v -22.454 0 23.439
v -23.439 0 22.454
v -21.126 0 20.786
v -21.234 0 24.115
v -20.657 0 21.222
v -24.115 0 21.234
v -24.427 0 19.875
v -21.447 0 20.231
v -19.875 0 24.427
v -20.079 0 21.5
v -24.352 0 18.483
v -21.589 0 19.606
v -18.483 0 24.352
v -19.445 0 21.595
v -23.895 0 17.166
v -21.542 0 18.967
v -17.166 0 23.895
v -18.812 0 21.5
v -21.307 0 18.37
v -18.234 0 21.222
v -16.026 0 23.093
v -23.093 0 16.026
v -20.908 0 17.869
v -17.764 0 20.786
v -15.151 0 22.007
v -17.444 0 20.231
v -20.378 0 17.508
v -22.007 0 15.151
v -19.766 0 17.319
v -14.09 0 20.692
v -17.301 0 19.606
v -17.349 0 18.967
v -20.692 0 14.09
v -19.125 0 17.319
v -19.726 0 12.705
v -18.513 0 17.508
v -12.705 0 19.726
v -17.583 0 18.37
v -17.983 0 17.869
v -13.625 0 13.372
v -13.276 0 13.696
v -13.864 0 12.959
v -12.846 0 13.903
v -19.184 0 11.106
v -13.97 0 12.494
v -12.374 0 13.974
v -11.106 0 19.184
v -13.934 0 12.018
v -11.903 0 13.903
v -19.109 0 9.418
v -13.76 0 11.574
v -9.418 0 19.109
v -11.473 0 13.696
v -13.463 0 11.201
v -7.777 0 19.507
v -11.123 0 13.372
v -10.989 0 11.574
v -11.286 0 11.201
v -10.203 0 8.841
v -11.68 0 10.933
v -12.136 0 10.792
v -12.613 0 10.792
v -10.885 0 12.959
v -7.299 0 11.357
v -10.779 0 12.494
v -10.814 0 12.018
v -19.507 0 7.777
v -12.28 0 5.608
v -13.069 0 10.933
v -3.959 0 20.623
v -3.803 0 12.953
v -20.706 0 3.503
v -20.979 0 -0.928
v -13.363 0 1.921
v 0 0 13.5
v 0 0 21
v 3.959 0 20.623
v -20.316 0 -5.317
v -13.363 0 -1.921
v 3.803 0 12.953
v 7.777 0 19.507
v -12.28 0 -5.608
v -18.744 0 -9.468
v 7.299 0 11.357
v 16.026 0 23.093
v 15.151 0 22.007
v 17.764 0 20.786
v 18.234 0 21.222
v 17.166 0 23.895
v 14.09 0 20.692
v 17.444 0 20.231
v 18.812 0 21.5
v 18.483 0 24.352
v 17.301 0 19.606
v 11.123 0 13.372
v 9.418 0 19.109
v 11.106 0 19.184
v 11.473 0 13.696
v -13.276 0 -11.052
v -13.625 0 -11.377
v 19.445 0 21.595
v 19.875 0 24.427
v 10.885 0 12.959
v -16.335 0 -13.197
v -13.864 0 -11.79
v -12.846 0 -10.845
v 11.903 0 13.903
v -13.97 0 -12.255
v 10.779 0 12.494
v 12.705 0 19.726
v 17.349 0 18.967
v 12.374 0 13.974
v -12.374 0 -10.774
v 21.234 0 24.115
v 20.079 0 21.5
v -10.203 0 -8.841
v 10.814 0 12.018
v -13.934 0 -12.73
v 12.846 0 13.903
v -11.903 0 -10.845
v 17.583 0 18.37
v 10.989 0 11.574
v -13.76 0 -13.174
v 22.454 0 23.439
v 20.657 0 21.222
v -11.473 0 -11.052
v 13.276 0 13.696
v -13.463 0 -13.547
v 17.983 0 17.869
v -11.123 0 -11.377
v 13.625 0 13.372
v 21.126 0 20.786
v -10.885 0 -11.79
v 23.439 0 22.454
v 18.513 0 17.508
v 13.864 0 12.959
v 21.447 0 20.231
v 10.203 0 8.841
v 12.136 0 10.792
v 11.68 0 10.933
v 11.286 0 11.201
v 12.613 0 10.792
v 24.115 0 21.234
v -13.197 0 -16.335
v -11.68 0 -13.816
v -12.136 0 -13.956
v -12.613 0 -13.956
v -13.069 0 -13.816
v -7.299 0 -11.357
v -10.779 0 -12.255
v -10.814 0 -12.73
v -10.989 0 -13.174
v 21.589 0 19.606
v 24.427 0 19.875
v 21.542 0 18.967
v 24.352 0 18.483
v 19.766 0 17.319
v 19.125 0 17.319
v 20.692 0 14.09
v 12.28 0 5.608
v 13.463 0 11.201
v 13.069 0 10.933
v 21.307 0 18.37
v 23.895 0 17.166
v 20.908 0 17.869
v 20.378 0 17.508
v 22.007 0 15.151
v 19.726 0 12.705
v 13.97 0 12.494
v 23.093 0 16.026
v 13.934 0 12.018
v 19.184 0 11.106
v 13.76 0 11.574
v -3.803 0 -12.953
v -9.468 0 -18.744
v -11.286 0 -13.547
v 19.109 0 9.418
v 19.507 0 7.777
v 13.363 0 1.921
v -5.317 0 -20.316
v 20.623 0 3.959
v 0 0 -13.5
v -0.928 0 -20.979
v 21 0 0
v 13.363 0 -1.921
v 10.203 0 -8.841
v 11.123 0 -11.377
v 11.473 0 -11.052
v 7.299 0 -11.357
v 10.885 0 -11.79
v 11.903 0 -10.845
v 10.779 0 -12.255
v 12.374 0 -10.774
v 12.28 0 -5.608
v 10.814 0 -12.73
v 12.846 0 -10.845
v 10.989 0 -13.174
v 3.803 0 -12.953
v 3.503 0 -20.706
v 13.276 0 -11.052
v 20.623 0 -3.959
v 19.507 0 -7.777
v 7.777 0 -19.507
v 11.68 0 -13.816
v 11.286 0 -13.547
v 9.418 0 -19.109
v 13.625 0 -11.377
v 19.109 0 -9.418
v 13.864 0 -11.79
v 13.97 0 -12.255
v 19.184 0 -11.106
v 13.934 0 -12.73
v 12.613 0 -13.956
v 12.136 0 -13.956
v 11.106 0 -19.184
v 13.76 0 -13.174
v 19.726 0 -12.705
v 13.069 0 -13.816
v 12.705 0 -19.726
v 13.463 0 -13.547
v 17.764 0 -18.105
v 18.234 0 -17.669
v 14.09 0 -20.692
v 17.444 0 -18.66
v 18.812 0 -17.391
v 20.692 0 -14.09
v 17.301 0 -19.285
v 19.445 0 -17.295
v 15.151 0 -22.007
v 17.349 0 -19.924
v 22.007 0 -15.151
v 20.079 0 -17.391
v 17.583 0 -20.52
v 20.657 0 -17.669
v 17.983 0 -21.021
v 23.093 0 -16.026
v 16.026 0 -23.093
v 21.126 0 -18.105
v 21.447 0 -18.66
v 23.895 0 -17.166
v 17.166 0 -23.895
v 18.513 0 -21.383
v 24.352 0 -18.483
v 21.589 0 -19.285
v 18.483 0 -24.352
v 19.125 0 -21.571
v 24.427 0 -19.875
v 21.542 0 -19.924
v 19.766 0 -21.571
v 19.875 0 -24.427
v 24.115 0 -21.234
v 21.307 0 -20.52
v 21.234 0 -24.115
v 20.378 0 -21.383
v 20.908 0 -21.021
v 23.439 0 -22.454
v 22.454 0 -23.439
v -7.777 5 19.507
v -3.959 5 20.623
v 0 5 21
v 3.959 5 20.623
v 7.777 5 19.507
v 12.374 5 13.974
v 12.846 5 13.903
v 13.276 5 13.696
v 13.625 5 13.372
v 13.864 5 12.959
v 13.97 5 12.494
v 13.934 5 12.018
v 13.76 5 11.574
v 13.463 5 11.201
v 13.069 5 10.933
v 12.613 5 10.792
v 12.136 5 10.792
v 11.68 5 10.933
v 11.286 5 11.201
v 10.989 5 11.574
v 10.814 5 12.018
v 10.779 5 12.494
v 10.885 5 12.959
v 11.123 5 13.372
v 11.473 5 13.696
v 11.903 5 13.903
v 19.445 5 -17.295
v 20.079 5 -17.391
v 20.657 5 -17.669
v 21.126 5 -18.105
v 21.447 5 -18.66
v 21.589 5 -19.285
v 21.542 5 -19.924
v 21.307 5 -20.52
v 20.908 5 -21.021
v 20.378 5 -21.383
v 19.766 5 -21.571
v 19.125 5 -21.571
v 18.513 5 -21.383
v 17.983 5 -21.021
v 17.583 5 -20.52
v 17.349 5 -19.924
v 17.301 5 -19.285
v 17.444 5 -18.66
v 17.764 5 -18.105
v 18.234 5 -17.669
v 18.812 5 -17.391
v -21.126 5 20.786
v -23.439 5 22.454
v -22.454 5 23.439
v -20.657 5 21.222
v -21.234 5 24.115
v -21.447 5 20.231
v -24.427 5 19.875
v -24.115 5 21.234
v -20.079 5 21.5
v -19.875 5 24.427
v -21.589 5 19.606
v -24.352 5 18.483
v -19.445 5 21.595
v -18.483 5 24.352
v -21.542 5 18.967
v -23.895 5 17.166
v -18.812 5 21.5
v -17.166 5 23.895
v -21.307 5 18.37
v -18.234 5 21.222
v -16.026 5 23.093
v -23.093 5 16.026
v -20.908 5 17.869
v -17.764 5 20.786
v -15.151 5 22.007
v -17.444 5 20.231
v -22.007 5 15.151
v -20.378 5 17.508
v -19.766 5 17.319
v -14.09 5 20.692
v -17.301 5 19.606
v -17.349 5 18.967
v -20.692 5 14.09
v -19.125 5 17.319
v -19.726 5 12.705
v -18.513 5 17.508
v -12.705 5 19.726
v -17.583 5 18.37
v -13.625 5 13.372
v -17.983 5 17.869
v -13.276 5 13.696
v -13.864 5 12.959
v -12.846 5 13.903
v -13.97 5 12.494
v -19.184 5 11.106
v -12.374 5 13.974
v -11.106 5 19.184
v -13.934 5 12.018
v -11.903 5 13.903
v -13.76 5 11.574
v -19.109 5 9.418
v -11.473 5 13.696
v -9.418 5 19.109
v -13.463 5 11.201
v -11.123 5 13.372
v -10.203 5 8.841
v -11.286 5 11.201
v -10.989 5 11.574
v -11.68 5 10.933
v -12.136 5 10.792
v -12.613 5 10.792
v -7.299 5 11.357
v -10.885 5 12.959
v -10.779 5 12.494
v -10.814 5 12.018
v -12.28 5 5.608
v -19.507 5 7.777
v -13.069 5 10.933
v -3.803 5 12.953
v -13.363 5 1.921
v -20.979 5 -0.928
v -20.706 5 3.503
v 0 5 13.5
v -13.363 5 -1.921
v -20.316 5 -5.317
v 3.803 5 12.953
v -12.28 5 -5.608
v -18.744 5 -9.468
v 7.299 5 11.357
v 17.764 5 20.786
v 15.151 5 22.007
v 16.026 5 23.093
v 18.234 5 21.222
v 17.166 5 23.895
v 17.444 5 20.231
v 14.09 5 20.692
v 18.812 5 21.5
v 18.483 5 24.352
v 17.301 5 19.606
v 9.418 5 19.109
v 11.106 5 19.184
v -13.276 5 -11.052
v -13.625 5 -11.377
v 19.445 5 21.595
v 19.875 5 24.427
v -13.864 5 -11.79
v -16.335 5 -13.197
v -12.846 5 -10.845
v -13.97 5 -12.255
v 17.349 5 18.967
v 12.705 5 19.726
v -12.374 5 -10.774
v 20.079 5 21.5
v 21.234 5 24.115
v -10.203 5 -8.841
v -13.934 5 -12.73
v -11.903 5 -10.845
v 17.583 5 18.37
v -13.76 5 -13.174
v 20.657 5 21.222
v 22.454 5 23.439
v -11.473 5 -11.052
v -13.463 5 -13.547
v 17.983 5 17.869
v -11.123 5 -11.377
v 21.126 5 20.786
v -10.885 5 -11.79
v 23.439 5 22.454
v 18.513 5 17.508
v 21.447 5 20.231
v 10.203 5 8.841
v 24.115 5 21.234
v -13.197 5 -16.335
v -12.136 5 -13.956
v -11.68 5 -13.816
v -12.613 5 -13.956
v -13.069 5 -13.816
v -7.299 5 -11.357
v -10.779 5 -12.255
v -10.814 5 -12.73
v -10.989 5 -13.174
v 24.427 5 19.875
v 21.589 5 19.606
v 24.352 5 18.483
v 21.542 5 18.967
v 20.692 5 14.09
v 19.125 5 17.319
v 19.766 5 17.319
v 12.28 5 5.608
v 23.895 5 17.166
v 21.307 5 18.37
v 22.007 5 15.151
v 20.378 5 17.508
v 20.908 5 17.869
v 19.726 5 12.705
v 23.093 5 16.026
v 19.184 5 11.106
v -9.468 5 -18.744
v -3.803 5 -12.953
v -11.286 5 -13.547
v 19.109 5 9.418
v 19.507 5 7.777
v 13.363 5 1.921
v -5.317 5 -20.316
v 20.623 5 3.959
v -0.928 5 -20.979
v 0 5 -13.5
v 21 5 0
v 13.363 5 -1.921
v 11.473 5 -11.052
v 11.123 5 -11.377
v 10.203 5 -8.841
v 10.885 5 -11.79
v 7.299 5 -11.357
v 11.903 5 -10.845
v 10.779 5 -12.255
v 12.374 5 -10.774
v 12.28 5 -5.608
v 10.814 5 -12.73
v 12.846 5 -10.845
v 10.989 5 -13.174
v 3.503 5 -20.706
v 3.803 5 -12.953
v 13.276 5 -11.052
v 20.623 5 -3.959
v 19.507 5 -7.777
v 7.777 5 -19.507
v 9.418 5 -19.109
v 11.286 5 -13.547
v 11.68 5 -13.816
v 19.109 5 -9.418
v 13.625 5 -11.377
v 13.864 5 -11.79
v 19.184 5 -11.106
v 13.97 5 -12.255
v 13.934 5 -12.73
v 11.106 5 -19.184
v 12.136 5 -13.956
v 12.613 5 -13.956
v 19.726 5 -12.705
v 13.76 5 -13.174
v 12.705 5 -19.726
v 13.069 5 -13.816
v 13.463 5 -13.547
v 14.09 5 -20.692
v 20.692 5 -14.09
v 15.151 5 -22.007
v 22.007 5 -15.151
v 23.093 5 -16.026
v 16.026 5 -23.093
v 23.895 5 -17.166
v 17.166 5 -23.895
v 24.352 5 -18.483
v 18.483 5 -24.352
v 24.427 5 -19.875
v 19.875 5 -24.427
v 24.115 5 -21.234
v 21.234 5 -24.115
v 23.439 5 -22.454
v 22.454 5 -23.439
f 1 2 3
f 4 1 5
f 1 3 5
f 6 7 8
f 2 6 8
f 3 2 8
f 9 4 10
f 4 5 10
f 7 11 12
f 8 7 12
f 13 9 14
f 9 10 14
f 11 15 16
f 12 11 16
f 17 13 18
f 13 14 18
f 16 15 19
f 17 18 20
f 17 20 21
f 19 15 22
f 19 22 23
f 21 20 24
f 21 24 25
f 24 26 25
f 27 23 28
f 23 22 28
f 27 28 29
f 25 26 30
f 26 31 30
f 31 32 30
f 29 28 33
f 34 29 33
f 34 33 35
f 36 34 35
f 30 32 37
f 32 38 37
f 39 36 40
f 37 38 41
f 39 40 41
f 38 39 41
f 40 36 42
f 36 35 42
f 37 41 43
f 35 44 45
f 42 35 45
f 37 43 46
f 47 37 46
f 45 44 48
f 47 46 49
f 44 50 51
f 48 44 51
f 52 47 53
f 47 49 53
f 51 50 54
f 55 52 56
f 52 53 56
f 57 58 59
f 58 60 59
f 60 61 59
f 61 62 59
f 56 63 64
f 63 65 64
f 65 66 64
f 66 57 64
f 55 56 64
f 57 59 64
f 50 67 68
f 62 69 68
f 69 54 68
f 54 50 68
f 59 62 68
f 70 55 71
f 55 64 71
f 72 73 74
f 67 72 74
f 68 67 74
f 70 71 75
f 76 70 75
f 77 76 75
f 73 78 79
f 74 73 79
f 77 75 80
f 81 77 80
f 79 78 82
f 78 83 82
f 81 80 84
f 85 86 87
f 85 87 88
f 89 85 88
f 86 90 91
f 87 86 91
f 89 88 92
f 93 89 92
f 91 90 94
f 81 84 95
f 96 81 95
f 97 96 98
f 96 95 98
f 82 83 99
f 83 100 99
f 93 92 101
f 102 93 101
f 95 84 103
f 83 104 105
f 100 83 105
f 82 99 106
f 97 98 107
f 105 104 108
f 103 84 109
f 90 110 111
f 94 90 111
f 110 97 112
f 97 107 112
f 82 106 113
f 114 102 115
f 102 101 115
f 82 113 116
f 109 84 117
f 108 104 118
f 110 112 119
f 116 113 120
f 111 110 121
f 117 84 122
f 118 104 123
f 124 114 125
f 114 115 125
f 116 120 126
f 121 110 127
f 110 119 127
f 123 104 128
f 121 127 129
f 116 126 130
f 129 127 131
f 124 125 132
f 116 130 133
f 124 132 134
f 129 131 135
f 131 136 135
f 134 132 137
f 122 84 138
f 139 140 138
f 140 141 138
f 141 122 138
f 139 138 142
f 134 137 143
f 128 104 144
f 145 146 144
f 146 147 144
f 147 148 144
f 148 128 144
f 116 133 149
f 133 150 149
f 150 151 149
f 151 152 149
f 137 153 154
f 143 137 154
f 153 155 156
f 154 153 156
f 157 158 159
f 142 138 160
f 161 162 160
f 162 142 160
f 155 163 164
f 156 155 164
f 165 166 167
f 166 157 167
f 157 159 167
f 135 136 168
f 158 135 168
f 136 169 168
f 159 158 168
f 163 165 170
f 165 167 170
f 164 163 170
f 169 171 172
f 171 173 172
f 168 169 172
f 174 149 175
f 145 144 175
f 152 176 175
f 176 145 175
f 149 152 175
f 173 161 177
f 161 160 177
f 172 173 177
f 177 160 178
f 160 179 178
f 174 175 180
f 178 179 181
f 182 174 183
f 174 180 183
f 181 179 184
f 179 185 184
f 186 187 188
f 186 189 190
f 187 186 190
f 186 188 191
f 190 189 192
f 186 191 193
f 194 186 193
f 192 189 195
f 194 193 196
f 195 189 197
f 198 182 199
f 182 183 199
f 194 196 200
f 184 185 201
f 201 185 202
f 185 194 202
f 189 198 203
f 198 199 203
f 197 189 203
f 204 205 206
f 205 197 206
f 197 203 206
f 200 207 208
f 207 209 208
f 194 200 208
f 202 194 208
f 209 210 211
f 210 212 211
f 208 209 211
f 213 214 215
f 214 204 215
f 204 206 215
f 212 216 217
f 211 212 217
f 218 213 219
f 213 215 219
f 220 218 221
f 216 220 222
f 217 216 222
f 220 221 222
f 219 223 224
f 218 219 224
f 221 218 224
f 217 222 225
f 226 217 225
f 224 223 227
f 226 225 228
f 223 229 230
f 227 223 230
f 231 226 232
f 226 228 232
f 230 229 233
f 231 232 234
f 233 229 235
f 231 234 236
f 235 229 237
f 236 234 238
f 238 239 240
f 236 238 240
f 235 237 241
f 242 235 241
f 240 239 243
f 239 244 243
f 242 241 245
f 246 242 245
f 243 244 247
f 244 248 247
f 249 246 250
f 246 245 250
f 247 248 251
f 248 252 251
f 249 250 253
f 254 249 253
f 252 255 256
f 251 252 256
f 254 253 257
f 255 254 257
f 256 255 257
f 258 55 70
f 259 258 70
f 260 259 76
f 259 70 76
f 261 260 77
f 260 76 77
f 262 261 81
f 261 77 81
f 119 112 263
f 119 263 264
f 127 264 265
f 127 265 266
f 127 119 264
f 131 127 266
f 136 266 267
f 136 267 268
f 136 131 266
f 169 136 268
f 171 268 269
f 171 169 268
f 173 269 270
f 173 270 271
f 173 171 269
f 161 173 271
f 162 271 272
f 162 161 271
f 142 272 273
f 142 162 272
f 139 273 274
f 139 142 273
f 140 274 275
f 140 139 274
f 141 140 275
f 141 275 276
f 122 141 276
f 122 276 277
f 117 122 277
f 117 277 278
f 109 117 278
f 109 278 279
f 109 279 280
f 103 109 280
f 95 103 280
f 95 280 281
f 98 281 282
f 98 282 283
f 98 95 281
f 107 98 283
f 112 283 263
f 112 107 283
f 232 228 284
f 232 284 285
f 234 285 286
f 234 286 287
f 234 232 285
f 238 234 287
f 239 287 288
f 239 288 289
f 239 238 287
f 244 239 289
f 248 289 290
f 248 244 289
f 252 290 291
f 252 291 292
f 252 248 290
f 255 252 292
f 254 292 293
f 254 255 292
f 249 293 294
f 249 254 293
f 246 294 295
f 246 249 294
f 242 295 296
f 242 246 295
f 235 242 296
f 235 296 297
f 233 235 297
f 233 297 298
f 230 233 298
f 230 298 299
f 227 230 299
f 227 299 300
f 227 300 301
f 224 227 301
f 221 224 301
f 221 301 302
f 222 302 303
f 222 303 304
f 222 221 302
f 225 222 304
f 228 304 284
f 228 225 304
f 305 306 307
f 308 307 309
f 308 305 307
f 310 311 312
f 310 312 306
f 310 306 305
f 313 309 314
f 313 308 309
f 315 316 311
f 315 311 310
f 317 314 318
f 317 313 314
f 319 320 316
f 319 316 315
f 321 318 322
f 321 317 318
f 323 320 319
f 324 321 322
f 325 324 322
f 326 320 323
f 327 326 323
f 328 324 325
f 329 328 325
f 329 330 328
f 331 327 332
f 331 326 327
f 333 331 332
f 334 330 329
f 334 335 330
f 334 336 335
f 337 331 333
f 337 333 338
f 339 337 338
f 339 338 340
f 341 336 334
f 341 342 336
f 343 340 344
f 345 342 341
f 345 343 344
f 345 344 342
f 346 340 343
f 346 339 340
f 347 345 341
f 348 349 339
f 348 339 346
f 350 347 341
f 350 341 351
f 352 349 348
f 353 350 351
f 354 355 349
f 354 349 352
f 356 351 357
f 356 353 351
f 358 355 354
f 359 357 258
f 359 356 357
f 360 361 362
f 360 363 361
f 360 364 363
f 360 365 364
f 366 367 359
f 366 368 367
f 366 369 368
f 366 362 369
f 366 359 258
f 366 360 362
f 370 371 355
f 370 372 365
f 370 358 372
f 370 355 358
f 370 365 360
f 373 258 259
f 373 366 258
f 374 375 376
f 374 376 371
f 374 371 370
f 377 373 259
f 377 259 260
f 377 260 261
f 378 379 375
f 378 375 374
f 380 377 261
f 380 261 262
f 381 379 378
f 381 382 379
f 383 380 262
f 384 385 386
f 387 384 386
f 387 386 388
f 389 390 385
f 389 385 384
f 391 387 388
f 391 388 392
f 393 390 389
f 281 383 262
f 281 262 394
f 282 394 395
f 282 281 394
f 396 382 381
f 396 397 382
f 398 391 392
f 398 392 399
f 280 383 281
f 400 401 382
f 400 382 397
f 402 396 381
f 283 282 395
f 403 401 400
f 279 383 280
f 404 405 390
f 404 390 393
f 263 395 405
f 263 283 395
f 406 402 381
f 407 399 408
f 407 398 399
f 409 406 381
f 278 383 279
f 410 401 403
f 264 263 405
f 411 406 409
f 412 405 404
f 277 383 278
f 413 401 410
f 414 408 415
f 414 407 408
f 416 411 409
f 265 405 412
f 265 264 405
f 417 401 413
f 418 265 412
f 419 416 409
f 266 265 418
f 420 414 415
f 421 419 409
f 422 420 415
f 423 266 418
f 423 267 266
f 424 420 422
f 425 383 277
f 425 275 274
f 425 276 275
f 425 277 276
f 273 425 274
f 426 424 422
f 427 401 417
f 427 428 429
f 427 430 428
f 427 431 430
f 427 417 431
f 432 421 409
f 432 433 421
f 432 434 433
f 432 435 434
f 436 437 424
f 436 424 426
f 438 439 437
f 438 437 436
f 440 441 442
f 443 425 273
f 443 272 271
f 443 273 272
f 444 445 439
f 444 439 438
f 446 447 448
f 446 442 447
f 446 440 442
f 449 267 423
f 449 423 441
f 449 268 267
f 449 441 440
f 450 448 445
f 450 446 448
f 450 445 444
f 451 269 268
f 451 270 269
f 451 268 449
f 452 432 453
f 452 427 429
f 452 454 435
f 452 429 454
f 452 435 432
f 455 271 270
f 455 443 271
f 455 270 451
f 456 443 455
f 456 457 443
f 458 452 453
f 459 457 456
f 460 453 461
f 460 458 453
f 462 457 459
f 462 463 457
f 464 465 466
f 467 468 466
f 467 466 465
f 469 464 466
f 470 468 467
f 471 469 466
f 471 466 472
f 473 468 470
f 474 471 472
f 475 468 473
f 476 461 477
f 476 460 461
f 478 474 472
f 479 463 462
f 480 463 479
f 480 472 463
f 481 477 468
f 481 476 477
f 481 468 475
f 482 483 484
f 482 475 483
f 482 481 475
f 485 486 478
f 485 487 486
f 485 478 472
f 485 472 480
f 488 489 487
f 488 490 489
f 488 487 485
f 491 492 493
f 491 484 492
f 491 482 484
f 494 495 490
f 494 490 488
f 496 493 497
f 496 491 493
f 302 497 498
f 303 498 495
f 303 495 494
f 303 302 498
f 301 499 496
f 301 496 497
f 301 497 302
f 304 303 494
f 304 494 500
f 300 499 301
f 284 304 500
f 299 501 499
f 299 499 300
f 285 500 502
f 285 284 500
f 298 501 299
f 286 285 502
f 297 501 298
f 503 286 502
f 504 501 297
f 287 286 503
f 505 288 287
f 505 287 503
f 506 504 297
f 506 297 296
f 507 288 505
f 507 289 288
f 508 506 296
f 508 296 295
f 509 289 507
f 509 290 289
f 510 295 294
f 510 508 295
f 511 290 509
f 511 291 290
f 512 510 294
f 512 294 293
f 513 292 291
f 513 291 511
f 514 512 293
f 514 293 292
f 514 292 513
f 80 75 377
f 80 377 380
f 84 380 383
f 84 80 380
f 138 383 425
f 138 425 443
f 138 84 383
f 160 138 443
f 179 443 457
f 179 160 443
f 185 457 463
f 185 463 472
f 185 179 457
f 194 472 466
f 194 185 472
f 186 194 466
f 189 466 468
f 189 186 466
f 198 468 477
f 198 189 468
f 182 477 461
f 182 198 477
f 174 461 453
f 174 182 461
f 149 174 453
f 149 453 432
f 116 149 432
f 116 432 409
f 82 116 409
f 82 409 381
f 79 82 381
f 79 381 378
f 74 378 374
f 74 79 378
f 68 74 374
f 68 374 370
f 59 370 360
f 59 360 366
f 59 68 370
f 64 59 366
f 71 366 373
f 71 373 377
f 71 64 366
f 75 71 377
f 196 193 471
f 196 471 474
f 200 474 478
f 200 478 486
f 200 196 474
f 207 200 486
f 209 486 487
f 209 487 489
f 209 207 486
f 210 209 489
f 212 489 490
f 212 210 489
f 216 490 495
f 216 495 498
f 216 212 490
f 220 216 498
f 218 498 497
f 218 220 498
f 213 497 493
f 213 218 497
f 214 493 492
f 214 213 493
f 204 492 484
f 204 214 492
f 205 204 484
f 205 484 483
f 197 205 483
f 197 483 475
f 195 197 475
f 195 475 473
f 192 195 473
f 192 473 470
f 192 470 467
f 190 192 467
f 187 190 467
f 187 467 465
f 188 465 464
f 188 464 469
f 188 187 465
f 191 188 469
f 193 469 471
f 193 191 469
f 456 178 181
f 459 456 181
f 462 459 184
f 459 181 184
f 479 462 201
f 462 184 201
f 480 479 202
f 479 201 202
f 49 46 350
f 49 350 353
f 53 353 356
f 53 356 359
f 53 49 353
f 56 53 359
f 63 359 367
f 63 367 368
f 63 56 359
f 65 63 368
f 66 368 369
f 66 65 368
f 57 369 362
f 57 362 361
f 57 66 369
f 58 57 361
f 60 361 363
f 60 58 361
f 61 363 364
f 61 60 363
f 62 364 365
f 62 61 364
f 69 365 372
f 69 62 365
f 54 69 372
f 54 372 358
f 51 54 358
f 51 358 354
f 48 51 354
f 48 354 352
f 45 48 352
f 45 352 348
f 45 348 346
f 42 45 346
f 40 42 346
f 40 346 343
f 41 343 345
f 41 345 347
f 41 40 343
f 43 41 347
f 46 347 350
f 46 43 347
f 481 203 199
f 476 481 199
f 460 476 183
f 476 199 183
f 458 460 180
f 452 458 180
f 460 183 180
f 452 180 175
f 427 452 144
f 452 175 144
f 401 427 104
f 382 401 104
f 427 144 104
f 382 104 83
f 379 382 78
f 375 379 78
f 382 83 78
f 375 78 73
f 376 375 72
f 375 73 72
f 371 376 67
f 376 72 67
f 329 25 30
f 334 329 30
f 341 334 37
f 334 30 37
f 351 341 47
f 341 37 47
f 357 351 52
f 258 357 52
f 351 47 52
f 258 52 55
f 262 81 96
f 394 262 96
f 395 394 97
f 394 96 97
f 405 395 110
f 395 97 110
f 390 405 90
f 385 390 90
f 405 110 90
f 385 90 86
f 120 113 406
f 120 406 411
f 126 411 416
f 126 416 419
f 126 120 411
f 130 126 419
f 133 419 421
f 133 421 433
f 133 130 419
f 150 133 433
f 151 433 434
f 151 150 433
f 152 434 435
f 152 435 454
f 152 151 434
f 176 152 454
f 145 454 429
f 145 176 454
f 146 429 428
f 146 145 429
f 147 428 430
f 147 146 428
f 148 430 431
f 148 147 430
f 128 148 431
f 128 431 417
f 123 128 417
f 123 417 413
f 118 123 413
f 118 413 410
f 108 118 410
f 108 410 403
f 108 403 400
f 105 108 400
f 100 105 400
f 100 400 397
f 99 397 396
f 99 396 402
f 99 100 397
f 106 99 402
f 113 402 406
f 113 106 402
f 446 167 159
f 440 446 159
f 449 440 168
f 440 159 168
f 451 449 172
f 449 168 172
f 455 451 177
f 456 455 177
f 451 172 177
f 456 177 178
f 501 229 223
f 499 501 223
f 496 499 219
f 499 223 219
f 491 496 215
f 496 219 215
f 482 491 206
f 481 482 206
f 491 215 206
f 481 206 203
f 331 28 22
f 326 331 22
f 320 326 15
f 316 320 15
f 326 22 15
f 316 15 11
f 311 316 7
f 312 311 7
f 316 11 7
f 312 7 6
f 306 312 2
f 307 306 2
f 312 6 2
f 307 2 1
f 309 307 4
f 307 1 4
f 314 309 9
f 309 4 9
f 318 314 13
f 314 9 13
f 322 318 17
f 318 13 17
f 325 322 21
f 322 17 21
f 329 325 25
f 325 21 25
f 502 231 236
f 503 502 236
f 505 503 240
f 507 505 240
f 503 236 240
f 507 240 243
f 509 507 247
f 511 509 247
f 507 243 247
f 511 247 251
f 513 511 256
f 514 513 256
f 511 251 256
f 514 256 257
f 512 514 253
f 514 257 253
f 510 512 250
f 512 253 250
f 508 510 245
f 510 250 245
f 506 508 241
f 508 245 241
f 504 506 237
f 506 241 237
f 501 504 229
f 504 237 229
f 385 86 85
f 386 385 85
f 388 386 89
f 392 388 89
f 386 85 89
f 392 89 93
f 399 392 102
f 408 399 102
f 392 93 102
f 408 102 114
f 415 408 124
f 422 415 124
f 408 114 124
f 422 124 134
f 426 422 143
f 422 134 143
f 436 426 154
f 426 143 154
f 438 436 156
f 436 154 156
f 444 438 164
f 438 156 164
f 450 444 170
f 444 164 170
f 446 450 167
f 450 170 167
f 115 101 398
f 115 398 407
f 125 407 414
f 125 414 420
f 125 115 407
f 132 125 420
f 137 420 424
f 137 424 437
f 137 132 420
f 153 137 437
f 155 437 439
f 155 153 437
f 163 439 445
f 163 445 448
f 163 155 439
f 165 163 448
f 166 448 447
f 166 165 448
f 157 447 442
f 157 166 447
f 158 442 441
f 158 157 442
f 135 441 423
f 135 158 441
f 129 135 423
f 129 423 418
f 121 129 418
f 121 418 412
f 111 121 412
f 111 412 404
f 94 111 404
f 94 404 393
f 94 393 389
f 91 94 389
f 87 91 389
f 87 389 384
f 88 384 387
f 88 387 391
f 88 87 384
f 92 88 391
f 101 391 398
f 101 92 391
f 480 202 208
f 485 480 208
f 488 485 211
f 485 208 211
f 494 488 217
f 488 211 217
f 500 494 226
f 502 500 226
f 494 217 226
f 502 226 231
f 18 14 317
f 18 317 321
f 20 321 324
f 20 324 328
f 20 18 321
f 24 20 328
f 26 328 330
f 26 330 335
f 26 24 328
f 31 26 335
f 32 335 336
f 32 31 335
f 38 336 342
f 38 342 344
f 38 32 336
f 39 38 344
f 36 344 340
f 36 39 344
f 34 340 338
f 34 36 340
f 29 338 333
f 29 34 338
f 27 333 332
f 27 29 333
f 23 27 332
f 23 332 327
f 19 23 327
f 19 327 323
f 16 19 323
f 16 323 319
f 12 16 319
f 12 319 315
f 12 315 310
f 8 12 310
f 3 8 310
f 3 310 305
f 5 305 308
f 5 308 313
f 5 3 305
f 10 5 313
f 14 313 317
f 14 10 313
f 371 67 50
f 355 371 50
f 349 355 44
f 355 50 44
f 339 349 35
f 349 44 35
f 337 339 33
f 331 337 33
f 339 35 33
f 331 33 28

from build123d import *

# Parameters (mm, degrees)
SKETCH_1_R      = 13.5
SKETCH_1_R_2    = 1.6
SKETCH_1_R_3    = 2.15
EXTRUDE_1_DEPTH = 5


with BuildPart() as part:
    # ｽｹｯﾁ1 → ﾎﾞｽ - 押し出し1 (new body)
    with BuildSketch(Plane(origin=(0, 0, 0), x_dir=(1, 0, 0), z_dir=(0, 1, 0))):
        with BuildLine():
            ThreePointArc((15.151339784, 22.006829374), (11.924552334, 19.398069264), (7.776551803, 19.507056212))
            ThreePointArc((7.776551803, 19.507056212), (-14.849242405, 14.849242405), (-19.507056212, -7.776551803))
            ThreePointArc((-19.507056212, -7.776551803), (-19.398069264, -11.924552334), (-22.006829374, -15.151339784))
            ThreePointArc((-22.006829374, -15.151339784), (-22.980970389, -22.980970389), (-15.151339784, -22.006829374))
            ThreePointArc((-15.151339784, -22.006829374), (-11.924552334, -19.398069264), (-7.776551803, -19.507056212))
            ThreePointArc((-7.776551803, -19.507056212), (0, -21), (7.776551803, -19.507056212))
            ThreePointArc((7.776551803, -19.507056212), (11.924552334, -19.398069264), (15.151339784, -22.006829374))
            ThreePointArc((15.151339784, -22.006829374), (22.980970389, -22.980970389), (22.006829374, -15.151339784))
            ThreePointArc((22.006829374, -15.151339784), (19.398069264, -11.924552334), (19.507056212, -7.776551803))
            ThreePointArc((19.507056212, -7.776551803), (21, 0), (19.507056212, 7.776551803))
            ThreePointArc((19.507056212, 7.776551803), (19.398069264, 11.924552334), (22.006829374, 15.151339784))
            ThreePointArc((22.006829374, 15.151339784), (22.980970389, 22.980970389), (15.151339784, 22.006829374))
        make_face()
        with Locations(Location((0, 0, 0), (0, 0, 270))):
            Circle(SKETCH_1_R, mode=Mode.SUBTRACT)
        with Locations(Location((12.374368671, 12.374368671, 0), (0, 0, 270))):
            Circle(SKETCH_1_R_2, mode=Mode.SUBTRACT)
        with Locations(Location((12.374368671, -12.374368671, 0), (0, 0, 270))):
            Circle(SKETCH_1_R_2, mode=Mode.SUBTRACT)
        with Locations(Location((-12.374368671, -12.374368671, 0), (0, 0, 270))):
            Circle(SKETCH_1_R_2, mode=Mode.SUBTRACT)
        with Locations(Location((-12.374368671, 12.374368671, 0), (0, 0, 270))):
            Circle(SKETCH_1_R_2, mode=Mode.SUBTRACT)
        with Locations(Location((19.445436483, 19.445436483, 0), (0, 0, 270))):
            Circle(SKETCH_1_R_3, mode=Mode.SUBTRACT)
        with Locations(Location((19.445436483, -19.445436483, 0), (0, 0, 270))):
            Circle(SKETCH_1_R_3, mode=Mode.SUBTRACT)
        with Locations(Location((-19.445436483, -19.445436483, 0), (0, 0, 270))):
            Circle(SKETCH_1_R_3, mode=Mode.SUBTRACT)
    extrude(amount=EXTRUDE_1_DEPTH)


solid = part.part
